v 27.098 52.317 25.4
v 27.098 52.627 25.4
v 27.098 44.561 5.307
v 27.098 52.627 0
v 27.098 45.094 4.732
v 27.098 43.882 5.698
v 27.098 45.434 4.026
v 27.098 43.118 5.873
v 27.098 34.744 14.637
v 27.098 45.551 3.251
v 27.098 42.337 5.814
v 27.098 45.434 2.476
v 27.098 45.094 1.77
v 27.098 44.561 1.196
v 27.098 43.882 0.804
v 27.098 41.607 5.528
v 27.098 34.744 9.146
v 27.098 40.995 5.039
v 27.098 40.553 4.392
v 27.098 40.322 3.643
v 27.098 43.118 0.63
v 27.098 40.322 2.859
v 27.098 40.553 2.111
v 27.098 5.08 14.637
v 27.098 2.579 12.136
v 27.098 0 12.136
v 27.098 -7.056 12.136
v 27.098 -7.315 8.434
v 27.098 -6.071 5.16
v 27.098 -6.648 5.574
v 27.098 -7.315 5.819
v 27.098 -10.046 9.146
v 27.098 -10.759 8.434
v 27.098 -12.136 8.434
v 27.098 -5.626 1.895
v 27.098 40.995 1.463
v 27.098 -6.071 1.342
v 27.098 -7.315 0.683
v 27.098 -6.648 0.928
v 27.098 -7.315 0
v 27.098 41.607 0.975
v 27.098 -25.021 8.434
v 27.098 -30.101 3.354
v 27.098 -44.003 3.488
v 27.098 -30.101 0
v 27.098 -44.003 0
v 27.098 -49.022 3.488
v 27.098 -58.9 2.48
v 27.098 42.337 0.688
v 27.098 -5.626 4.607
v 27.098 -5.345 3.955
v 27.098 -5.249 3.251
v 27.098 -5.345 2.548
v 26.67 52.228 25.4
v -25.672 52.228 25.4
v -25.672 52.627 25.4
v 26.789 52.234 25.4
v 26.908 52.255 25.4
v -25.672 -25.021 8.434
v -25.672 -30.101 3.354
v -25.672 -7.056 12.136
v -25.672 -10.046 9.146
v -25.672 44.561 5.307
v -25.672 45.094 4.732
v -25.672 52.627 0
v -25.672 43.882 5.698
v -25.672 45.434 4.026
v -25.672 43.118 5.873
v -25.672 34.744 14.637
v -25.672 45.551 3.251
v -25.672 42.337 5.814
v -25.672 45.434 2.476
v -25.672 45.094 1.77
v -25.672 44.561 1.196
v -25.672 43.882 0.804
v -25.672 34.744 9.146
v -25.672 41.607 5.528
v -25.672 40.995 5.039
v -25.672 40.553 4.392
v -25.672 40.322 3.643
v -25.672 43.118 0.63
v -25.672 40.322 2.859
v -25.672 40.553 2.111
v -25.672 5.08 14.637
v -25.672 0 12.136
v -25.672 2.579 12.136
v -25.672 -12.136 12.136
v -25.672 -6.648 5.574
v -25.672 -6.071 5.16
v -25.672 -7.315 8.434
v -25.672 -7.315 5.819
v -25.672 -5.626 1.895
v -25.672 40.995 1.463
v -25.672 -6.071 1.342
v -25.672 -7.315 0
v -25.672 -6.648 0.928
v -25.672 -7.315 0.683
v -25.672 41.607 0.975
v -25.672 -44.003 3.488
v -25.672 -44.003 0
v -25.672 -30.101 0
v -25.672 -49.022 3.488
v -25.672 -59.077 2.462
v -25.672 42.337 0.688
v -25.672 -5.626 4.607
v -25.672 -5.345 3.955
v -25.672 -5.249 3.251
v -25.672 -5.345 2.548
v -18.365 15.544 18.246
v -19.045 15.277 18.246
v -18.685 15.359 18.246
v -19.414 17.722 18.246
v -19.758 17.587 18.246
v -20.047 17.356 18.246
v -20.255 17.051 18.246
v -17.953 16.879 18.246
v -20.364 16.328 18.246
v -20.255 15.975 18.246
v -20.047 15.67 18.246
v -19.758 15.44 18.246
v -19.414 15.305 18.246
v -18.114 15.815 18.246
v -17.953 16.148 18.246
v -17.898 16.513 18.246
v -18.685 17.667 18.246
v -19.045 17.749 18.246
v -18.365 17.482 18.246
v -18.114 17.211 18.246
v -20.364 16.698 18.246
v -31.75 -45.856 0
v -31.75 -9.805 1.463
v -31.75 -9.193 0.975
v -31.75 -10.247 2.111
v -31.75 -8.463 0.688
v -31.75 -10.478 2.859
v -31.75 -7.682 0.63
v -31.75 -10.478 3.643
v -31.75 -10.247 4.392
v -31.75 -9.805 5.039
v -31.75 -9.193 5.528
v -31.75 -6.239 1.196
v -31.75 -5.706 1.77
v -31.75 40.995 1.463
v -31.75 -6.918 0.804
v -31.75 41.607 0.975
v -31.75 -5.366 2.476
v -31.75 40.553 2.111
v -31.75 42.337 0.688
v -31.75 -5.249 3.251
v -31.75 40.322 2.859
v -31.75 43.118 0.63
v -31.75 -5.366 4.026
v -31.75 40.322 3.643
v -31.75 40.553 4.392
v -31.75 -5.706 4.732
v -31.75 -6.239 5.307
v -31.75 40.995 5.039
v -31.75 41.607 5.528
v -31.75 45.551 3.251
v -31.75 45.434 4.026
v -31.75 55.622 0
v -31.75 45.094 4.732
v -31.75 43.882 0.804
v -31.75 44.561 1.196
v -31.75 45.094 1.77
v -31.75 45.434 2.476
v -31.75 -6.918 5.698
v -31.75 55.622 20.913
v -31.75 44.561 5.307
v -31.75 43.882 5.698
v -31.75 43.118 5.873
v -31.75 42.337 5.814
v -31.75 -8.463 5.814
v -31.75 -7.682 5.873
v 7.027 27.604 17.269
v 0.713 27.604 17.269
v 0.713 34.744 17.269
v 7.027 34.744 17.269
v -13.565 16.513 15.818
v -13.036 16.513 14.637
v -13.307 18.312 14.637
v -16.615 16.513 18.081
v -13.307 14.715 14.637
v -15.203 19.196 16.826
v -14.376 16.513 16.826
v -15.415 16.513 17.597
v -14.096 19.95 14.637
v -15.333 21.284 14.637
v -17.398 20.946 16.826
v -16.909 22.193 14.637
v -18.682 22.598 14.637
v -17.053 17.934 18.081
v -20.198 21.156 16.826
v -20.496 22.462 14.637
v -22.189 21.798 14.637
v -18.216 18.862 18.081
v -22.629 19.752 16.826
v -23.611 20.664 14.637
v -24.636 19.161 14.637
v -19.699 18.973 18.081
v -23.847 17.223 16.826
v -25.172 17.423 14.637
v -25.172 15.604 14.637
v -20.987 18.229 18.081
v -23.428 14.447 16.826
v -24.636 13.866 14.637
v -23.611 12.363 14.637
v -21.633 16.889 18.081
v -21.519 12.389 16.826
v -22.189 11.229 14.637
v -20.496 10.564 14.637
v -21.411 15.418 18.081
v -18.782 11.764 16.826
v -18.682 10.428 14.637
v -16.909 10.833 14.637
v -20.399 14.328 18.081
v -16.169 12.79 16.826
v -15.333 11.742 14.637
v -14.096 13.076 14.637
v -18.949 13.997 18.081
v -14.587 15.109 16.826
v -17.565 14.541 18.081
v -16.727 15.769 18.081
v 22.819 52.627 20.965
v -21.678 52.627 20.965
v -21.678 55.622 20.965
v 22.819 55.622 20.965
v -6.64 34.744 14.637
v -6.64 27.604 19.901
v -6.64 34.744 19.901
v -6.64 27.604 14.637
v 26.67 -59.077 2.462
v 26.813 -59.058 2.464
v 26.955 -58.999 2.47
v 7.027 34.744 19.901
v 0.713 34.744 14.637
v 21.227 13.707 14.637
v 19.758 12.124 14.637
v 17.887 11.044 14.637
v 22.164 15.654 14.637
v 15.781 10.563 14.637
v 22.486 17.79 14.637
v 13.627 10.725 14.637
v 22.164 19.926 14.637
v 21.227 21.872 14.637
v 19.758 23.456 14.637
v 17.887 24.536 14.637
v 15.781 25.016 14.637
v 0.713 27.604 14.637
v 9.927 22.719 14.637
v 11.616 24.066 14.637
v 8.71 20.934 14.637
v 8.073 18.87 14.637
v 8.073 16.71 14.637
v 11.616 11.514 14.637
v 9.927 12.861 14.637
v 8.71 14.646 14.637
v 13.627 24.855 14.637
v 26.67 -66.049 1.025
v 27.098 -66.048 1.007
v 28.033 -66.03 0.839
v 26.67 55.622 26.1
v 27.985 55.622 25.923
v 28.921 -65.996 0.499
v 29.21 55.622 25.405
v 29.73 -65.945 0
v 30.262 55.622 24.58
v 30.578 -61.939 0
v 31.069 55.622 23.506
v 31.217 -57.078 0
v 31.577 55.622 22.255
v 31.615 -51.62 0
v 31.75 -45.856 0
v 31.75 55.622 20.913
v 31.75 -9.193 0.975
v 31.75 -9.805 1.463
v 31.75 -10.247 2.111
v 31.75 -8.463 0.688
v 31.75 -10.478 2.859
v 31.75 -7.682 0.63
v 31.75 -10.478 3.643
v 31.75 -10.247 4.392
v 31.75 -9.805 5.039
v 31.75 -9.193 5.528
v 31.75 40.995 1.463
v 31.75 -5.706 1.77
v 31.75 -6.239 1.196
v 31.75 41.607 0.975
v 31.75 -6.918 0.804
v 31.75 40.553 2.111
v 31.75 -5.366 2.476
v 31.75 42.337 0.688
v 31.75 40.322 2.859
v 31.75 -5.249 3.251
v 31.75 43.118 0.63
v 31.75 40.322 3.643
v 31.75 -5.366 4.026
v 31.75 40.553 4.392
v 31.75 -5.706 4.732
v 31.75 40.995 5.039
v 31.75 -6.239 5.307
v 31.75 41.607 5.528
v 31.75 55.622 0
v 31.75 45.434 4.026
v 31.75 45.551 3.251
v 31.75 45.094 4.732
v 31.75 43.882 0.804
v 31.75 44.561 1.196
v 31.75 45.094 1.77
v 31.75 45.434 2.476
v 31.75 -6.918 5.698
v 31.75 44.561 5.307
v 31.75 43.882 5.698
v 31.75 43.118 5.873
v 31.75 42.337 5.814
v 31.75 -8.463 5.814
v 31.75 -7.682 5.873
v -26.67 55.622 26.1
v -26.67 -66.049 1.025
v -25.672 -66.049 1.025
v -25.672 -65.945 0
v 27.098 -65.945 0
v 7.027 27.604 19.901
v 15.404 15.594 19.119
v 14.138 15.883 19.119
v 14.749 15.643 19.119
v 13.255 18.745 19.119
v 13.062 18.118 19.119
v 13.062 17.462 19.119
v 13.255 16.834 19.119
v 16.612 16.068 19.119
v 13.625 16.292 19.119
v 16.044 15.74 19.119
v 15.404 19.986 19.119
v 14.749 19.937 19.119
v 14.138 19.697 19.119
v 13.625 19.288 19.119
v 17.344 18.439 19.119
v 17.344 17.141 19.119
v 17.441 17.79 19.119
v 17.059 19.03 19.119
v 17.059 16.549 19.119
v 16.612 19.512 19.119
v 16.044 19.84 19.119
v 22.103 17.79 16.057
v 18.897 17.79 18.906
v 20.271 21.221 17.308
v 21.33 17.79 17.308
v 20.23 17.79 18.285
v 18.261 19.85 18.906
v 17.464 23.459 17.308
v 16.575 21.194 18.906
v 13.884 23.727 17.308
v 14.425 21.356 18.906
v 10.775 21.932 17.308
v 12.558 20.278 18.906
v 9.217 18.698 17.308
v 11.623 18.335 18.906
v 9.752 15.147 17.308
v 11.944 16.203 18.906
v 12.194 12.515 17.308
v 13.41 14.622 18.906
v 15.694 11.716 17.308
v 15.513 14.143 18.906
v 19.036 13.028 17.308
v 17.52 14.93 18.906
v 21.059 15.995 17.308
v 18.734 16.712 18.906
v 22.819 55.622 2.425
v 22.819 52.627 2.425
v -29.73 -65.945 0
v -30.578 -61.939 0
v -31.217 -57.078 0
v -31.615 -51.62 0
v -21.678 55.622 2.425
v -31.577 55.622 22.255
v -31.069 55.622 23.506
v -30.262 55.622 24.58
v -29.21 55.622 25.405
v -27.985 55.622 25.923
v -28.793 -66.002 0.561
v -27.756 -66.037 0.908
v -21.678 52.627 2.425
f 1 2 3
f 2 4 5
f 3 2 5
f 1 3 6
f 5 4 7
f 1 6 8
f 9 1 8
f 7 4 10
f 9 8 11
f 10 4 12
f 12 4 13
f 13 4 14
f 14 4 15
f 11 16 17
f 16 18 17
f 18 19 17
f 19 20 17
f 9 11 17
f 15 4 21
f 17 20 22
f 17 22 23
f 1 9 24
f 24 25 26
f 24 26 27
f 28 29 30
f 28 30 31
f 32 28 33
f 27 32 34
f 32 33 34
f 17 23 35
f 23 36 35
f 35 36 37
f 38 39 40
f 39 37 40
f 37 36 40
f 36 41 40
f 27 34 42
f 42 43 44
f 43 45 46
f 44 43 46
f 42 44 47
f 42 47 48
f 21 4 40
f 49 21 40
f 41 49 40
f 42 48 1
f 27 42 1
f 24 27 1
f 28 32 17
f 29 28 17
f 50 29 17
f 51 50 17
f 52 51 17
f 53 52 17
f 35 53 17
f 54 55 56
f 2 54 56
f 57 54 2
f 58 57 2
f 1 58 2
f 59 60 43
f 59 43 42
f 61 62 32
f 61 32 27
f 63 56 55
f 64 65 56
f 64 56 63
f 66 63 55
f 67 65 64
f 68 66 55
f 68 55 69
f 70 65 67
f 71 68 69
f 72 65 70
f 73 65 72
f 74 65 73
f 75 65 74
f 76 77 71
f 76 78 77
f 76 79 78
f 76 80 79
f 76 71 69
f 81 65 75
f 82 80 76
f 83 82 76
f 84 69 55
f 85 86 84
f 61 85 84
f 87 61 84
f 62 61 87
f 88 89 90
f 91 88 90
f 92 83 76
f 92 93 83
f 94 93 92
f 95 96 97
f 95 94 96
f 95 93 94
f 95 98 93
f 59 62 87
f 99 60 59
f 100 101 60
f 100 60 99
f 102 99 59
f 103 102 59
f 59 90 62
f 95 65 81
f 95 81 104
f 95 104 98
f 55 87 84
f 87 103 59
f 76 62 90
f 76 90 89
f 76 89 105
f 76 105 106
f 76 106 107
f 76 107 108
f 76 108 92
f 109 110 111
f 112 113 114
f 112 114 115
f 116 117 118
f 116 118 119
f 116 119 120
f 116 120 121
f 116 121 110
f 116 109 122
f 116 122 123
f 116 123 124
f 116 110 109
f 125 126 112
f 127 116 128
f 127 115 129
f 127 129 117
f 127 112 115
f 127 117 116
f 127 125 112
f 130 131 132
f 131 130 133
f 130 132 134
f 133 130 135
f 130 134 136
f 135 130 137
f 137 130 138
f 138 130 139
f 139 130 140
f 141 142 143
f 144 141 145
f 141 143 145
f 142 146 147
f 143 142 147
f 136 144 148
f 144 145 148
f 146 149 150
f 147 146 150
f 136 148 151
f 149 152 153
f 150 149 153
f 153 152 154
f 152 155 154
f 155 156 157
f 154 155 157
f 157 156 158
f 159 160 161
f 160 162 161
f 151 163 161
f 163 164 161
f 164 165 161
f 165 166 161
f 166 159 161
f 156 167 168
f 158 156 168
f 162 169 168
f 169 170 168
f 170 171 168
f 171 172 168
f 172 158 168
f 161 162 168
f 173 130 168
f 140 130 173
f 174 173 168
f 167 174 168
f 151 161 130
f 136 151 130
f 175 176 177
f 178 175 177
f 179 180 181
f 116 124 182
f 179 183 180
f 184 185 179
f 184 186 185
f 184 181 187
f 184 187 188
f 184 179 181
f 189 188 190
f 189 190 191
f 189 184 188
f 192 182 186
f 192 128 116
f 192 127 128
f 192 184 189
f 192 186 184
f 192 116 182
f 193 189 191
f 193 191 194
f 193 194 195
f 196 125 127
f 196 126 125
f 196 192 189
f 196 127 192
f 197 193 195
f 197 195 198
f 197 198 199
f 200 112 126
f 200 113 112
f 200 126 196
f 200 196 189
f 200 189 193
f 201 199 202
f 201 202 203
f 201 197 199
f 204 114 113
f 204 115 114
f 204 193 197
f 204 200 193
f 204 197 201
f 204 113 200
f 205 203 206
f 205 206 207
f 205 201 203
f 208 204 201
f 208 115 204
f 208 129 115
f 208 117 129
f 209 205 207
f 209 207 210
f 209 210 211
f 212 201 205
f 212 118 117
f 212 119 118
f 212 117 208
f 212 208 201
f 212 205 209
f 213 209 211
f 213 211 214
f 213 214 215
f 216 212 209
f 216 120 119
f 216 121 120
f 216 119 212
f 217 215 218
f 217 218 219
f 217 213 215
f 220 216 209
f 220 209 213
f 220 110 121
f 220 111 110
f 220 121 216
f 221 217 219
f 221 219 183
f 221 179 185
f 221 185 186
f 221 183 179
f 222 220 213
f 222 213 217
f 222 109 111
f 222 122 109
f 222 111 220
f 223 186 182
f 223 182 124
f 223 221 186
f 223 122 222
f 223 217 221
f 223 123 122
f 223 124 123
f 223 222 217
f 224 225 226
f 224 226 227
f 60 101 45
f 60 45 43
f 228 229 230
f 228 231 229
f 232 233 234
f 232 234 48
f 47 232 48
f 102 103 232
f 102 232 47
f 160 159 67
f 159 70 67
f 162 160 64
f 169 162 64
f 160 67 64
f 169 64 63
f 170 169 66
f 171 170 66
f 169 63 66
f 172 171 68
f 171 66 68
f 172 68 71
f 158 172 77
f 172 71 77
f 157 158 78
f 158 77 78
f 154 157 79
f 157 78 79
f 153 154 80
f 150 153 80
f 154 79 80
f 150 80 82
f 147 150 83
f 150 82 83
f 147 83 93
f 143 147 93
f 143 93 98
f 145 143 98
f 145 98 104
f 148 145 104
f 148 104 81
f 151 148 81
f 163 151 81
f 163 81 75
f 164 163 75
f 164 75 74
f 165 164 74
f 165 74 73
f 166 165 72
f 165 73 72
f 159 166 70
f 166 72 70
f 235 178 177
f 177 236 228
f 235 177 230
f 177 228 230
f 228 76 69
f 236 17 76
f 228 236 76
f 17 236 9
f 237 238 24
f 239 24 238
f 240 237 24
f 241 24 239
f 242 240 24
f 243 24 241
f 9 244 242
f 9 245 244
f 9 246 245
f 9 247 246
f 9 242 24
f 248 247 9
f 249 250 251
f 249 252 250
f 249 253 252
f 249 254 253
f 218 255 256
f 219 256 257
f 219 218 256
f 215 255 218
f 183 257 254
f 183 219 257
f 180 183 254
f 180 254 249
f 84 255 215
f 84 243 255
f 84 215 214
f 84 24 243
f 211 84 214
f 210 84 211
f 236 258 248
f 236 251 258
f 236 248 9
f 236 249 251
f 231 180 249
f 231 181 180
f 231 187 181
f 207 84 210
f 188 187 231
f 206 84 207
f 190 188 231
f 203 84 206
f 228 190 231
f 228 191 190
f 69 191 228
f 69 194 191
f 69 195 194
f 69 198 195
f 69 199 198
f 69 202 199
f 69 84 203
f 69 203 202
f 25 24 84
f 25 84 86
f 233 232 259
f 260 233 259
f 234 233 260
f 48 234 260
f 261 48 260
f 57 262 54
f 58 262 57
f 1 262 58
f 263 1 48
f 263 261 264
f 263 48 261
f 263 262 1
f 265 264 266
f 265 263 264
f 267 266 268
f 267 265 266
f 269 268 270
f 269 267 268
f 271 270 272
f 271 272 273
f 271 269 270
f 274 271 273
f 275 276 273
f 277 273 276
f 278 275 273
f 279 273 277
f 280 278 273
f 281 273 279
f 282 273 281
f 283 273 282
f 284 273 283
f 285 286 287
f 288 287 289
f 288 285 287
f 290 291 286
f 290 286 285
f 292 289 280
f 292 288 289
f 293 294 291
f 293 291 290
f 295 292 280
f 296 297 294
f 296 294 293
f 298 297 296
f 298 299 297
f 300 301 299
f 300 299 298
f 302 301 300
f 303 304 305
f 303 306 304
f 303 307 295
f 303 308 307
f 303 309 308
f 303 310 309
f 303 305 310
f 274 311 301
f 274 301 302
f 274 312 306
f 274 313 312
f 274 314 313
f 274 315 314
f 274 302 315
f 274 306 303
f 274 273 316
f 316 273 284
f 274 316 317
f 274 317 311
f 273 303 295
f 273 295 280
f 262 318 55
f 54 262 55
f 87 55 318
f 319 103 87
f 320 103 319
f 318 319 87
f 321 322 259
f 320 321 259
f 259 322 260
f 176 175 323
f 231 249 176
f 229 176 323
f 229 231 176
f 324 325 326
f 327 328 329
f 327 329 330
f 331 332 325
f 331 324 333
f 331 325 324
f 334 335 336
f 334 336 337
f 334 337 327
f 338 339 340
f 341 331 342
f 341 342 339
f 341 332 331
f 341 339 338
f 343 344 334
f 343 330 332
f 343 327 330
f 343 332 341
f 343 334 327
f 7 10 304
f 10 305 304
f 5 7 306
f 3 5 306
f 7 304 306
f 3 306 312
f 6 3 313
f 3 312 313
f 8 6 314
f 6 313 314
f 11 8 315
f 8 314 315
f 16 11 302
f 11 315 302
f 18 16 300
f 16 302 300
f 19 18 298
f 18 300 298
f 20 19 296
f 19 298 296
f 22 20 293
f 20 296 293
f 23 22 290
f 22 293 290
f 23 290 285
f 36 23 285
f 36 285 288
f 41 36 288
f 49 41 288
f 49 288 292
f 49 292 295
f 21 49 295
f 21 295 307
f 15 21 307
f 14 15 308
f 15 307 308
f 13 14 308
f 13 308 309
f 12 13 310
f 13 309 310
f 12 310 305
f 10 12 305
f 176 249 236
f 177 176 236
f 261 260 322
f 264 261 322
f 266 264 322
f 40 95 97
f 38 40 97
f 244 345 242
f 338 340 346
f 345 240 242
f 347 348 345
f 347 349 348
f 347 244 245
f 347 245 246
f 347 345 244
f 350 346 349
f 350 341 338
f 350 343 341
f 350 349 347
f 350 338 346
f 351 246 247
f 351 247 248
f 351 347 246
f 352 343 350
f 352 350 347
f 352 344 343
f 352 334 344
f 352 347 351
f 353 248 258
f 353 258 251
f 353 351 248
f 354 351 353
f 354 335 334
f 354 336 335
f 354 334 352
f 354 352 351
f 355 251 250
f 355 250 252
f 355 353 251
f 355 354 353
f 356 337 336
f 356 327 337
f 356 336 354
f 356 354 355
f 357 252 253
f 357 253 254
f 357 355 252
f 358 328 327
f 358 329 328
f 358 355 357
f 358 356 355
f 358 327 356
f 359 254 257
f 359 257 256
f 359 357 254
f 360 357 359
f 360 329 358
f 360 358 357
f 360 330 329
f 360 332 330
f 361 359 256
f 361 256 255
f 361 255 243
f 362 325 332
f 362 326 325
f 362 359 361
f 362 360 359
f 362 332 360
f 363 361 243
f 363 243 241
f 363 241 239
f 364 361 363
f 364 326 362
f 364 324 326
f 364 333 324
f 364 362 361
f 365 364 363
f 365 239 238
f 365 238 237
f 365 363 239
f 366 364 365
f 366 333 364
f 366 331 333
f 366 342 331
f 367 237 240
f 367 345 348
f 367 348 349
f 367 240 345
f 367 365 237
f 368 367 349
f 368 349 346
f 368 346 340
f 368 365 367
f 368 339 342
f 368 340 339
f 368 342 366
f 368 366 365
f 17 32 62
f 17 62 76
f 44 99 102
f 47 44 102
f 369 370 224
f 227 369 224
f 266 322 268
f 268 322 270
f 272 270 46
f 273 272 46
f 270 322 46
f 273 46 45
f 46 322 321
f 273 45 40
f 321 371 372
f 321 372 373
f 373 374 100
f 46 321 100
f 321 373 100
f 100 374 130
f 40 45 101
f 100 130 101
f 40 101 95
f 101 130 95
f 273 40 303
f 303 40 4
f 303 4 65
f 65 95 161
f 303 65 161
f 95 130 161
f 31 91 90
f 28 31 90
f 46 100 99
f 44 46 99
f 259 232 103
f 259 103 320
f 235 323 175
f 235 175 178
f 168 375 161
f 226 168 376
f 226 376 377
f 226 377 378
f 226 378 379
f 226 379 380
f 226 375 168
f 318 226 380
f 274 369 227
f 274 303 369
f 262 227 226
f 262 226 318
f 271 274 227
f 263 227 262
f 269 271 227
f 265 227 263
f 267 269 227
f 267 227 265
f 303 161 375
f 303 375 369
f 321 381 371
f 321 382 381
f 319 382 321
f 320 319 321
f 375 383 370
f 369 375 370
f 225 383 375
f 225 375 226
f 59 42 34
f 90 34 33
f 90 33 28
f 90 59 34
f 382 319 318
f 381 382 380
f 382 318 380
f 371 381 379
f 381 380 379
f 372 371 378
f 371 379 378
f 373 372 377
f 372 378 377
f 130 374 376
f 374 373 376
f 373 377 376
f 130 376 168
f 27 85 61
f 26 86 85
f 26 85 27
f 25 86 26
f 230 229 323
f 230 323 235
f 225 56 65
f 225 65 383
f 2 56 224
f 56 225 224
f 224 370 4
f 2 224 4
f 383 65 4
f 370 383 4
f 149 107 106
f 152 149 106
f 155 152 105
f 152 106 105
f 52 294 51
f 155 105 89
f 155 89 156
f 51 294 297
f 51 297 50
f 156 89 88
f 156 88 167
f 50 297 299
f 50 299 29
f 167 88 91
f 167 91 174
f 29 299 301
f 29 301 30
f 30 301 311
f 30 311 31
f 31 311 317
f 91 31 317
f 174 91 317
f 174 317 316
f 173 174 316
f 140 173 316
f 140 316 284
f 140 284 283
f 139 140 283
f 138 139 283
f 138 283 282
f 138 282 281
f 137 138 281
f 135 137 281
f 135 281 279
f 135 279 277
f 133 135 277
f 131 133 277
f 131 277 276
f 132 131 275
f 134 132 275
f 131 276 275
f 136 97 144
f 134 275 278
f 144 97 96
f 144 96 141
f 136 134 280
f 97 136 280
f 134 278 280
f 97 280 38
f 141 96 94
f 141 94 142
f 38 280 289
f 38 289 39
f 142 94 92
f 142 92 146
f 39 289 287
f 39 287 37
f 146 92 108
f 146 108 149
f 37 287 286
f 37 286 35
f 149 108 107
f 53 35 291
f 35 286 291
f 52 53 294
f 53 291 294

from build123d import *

# Parameters (mm, degrees)
F1_DEPTH      = 31.75
F2_W          = 52.7695193887
F2_H          = 120.6567846239
F3_DEPTH      = 25.4
F4_W          = 44.4975402206
F4_H          = 18.5406431556
F5_DEPTH      = 25.4
F6_W          = 34.7439497709
F6_H          = 5.4911417693
F7_DEPTH      = 54.31181
F8_W          = 12.1364339493
F8_H          = 2.9900523731
F9_DEPTH      = 56.69838
F10_W         = 22.7860264232
F10_H         = 8.4337261604
F11_DEPTH     = 56.06512
F12_T1_DEPTH  = 52.7695193887
F12_T6_DEPTH  = 52.7695193887
F12_T11_DEPTH = 52.7695193887
F14_DEPTH     = 55.98348
F15_T1_DEPTH  = 52.7695193887
F16_R         = 7.2468545108
F17_DEPTH     = 4.48168
F19_SIZE      = 5.08
F20_T1_DEPTH  = 149.6281885647
F21_R         = 6.1019617507
F22_DEPTH     = 3.60881
F24_R         = 2.6289
F25_DEPTH     = 82.93478
F26_DEPTH     = 96.11065
F27_W         = 7.3527656496
F27_H         = 7.1394555271
F28_DEPTH     = 1.80312
F29_DEPTH     = 3.46127
F30_W         = 7.1394555271
F30_H         = 2.632195
F31_DEPTH     = 6.31406


# Not quite as in the source:
# - a fillet or chamfer that OpenCascade refuses, or shapes differently, is made with other operations: its cross-section is extruded or revolved along the edge and cut away or added


with BuildPart() as f1:
    # F0 (on Right) → F1 (new body, symmetric)
    with BuildSketch(Plane.YZ):
        Polygon((55.6219257414, 26.0995179415), (-71.0249170661, 0), (55.6219257414, 0), align=None)
    extrude(amount=F1_DEPTH, both=True)

    # F2 (on face) → F3 (cut)
    with BuildSketch(Plane(origin=(0, 0, 0), x_dir=(1, 0, 0), z_dir=(0, 0, -1))):
        with Locations((0.7131025195, 7.7014956623)):
            Rectangle(F2_W, F2_H)
    extrude(amount=-F3_DEPTH, mode=Mode.SUBTRACT)

    # F4 (on face) → F5 (cut)
    with BuildSketch(Plane.XZ.offset(-52.6268966496)):
        with Locations((0.5704807118, 11.6948671639)):
            Rectangle(F4_W, F4_H)
    extrude(amount=-F5_DEPTH, mode=Mode.SUBTRACT)

    # F6 (on face) → F7 (join)
    with BuildSketch(Plane.YZ.offset(-25.6716571748)):
        with Locations((17.3719748855, 11.8913206175)):
            Rectangle(F6_W, F6_H)
    extrude(amount=F7_DEPTH)

    # F8 (on face) → F9 (join)
    with BuildSketch(Plane.YZ.offset(-25.6716571748)):
        with Locations((-6.0682169747, 10.6407759194)):
            Rectangle(F8_W, F8_H)
    extrude(amount=F9_DEPTH)

    # F10 (on face) → F11 (join)
    with BuildSketch(Plane.YZ.offset(-25.6716571748)):
        with Locations((-18.7075927729, 4.2168630802)):
            Rectangle(F10_W, F10_H)
    extrude(amount=F11_DEPTH)

    # F12: chamfer of 5.08 on 3 edges, made by hand

    # F12_s2 → F12_t1 (cut)
    with BuildSketch(Plane.YZ.offset(-25.6716571748)):
        Polygon((-30.1006059845, 3.3537261604), (-25.0206059845, 8.4337261604), (-30.1006059845, 8.4337261604), align=None)
    extrude(amount=F12_T1_DEPTH, mode=Mode.SUBTRACT)


with BuildPart() as f12_tool4:
    # F12_s5 → F12_t6 (new body)
    with BuildSketch(Plane.YZ.offset(-25.6716571748)):
        Polygon((5.08, 14.6368915021), (0, 9.5568915021), (0, 14.6368915021), align=None)
    extrude(amount=F12_T6_DEPTH)

    split(bisect_by=Plane.XY.offset(12.1358021059), keep=Keep.TOP)


with BuildPart() as f1_1:
    add(f1.part)

    # F12_t3: cut F12_tool4
    add(f12_tool4.part, mode=Mode.SUBTRACT)


with BuildPart() as f12_tool9:
    # F12_s10 → F12_t11 (new body)
    with BuildSketch(Plane.YZ.offset(-25.6716571748)):
        Polygon((-12.1364339493, 7.0558021059), (-7.0564339493, 12.1358021059), (-12.1364339493, 12.1358021059), align=None)
    extrude(amount=F12_T11_DEPTH)

    split(bisect_by=Plane.XY.offset(8.4337261604), keep=Keep.TOP)


with BuildPart() as f1_2:
    add(f1_1.part)

    # F12_t8: cut F12_tool9
    add(f12_tool9.part, mode=Mode.SUBTRACT)

    # F13 (on face) → F14 (join)
    with BuildSketch(Plane.YZ.offset(-25.6716571748)):
        Polygon((-68.0298879743, 0), (-44.0034680068, 0), (-44.0034680068, 3.4875369165), (-54.1017868902, 3.4875369165), (-68.0298879743, 0.6172188251), align=None)
    extrude(amount=F14_DEPTH)

    # F15: chamfer of 5.08 on 1 edges, made by hand

    # F15_s2 → F15_t1 (cut)
    with BuildSketch(Plane.YZ.offset(-25.6716571748)):
        with BuildLine():
            Line((-59.2793850519, 2.4415783127), (-48.81963513, 3.5081501604))
            Line((-48.81963513, 3.5081501604), (-48.81963513, 3.6097501604))
            ThreePointArc((-48.81963513, 3.6097501604), (-51.4607110101, 3.5891369165), (-54.1017868902, 3.5891369165))
            Line((-54.1017868902, 3.5891369165), (-54.1222937974, 3.5870458445))
            ThreePointArc((-54.1222937974, 3.5870458445), (-56.7090125934, 3.0539720456), (-59.2998919591, 2.5410872407))
            Line((-59.2998919591, 2.5410872407), (-59.2793850519, 2.4415783127))
        make_face()
    extrude(amount=F15_T1_DEPTH, mode=Mode.SUBTRACT)

    # F16 (on face) → F17 (join)
    with BuildSketch(Plane.XY.offset(14.6368915021)):
        with Locations((15.2392005548, 17.7897959948)):
            Circle(F16_R)
    extrude(amount=F17_DEPTH)

    # F18: fillet of radius 5.08 on 1 edges, made by hand

    # F18_s1 → F18_t2 (revolve, cut)
    with BuildSketch(Plane.XZ.offset(-17.7897959948)):
        with BuildLine():
            ThreePointArc((22.4860550656, 14.6368915021), (20.8153524575, 17.8363251539), (17.4414130389, 19.1185715021))
            Line((17.4414130389, 19.1185715021), (22.4860550656, 19.1185715021))
            Line((22.4860550656, 19.1185715021), (22.4860550656, 14.6368915021))
        make_face()
    revolve(axis=Axis((15.2392005548, 17.7897959948, 19.1185715021), (0, 0, 1)), mode=Mode.SUBTRACT)

    # F19
    f19_edges = [f1_2.edges().sort_by_distance(p)[0] for p in [
        (0, -71.024917, 0),
    ]]
    chamfer(f19_edges, length=F19_SIZE)

    # F20: fillet of radius 5.08 on 2 edges, made by hand

    # F20_s2 → F20_t1 (cut)
    with BuildSketch(Plane(origin=(0, 70.954042843, 14.6222856658), x_dir=(1, 0, 0), z_dir=(0, -0.9794185829, -0.2018396378))):
        with BuildLine():
            ThreePointArc((-26.67, 14.3356435337), (-30.2621024484, 12.8477459822), (-31.75, 9.2556435337))
            Line((-31.75, 9.2556435337), (-31.75, 14.3356435337))
            Line((-31.75, 14.3356435337), (-26.67, 14.3356435337))
        make_face()
        with BuildLine():
            ThreePointArc((26.67, 14.3356435337), (30.2621024484, 12.8477459822), (31.75, 9.2556435337))
            Line((31.75, 9.2556435337), (31.75, 14.3356435337))
            Line((31.75, 14.3356435337), (26.67, 14.3356435337))
        make_face()
    extrude(amount=F20_T1_DEPTH, mode=Mode.SUBTRACT)

    # F21 (on face) → F22 (join)
    with BuildSketch(Plane.XY.offset(14.6368915021)):
        with Locations((-19.1379822791, 16.5131352842)):
            Circle(F21_R)
    extrude(amount=F22_DEPTH)

    # F23: fillet of radius 5.08 on 1 edges, made by hand

    # F23_s1 → F23_t2 (revolve, cut)
    with BuildSketch(Plane.XZ.offset(-16.5131352842)):
        with BuildLine():
            ThreePointArc((-13.0360205283, 14.6368915021), (-14.8707219244, 17.2449198831), (-17.8983245073, 18.2457015021))
            Line((-17.8983245073, 18.2457015021), (-13.0360205283, 18.2457015021))
            Line((-13.0360205283, 18.2457015021), (-13.0360205283, 14.6368915021))
        make_face()
    revolve(axis=Axis((-19.1379822791, 16.5131352842, 18.2457015021), (0, 0, 1)), mode=Mode.SUBTRACT)

    # F24 (on face) → F25 (cut)
    with BuildSketch(Plane.YZ.offset(31.75)):
        with Locations((-7.8780742586, 3.2512)):
            Circle(F24_R)
    extrude(amount=-F25_DEPTH, mode=Mode.SUBTRACT)

    # F24 (on face) → F26 (cut, symmetric)
    with BuildSketch(Plane.YZ.offset(31.75)):
        with Locations((-7.8780742586, 3.2512)):
            Circle(F24_R)
        with Locations((42.9219257414, 3.2512)):
            Circle(F24_R)
    extrude(amount=F26_DEPTH, both=True, mode=Mode.SUBTRACT)

    # F27 (on face) → F28 (join)
    with BuildSketch(Plane.XY.offset(14.6368915021)):
        with Locations((-2.9632803053, 31.1742220074)):
            Rectangle(F27_W, F27_H)
    extrude(amount=F28_DEPTH)

    # F29 (add): a face of the model
    f29_faces = [f1_2.faces().sort_by_distance(p)[0] for p in [
        (-2.9632803053, 31.1742220074, 16.4400115021),
    ]]
    extrude(f29_faces, amount=F29_DEPTH)

    # F30 (on face) → F31 (join)
    with BuildSketch(Plane.YZ.offset(0.7131025195)):
        with Locations((31.1742220074, 18.5851840021)):
            Rectangle(F30_W, F30_H)
    extrude(amount=F31_DEPTH)


solid = f1_2.part
